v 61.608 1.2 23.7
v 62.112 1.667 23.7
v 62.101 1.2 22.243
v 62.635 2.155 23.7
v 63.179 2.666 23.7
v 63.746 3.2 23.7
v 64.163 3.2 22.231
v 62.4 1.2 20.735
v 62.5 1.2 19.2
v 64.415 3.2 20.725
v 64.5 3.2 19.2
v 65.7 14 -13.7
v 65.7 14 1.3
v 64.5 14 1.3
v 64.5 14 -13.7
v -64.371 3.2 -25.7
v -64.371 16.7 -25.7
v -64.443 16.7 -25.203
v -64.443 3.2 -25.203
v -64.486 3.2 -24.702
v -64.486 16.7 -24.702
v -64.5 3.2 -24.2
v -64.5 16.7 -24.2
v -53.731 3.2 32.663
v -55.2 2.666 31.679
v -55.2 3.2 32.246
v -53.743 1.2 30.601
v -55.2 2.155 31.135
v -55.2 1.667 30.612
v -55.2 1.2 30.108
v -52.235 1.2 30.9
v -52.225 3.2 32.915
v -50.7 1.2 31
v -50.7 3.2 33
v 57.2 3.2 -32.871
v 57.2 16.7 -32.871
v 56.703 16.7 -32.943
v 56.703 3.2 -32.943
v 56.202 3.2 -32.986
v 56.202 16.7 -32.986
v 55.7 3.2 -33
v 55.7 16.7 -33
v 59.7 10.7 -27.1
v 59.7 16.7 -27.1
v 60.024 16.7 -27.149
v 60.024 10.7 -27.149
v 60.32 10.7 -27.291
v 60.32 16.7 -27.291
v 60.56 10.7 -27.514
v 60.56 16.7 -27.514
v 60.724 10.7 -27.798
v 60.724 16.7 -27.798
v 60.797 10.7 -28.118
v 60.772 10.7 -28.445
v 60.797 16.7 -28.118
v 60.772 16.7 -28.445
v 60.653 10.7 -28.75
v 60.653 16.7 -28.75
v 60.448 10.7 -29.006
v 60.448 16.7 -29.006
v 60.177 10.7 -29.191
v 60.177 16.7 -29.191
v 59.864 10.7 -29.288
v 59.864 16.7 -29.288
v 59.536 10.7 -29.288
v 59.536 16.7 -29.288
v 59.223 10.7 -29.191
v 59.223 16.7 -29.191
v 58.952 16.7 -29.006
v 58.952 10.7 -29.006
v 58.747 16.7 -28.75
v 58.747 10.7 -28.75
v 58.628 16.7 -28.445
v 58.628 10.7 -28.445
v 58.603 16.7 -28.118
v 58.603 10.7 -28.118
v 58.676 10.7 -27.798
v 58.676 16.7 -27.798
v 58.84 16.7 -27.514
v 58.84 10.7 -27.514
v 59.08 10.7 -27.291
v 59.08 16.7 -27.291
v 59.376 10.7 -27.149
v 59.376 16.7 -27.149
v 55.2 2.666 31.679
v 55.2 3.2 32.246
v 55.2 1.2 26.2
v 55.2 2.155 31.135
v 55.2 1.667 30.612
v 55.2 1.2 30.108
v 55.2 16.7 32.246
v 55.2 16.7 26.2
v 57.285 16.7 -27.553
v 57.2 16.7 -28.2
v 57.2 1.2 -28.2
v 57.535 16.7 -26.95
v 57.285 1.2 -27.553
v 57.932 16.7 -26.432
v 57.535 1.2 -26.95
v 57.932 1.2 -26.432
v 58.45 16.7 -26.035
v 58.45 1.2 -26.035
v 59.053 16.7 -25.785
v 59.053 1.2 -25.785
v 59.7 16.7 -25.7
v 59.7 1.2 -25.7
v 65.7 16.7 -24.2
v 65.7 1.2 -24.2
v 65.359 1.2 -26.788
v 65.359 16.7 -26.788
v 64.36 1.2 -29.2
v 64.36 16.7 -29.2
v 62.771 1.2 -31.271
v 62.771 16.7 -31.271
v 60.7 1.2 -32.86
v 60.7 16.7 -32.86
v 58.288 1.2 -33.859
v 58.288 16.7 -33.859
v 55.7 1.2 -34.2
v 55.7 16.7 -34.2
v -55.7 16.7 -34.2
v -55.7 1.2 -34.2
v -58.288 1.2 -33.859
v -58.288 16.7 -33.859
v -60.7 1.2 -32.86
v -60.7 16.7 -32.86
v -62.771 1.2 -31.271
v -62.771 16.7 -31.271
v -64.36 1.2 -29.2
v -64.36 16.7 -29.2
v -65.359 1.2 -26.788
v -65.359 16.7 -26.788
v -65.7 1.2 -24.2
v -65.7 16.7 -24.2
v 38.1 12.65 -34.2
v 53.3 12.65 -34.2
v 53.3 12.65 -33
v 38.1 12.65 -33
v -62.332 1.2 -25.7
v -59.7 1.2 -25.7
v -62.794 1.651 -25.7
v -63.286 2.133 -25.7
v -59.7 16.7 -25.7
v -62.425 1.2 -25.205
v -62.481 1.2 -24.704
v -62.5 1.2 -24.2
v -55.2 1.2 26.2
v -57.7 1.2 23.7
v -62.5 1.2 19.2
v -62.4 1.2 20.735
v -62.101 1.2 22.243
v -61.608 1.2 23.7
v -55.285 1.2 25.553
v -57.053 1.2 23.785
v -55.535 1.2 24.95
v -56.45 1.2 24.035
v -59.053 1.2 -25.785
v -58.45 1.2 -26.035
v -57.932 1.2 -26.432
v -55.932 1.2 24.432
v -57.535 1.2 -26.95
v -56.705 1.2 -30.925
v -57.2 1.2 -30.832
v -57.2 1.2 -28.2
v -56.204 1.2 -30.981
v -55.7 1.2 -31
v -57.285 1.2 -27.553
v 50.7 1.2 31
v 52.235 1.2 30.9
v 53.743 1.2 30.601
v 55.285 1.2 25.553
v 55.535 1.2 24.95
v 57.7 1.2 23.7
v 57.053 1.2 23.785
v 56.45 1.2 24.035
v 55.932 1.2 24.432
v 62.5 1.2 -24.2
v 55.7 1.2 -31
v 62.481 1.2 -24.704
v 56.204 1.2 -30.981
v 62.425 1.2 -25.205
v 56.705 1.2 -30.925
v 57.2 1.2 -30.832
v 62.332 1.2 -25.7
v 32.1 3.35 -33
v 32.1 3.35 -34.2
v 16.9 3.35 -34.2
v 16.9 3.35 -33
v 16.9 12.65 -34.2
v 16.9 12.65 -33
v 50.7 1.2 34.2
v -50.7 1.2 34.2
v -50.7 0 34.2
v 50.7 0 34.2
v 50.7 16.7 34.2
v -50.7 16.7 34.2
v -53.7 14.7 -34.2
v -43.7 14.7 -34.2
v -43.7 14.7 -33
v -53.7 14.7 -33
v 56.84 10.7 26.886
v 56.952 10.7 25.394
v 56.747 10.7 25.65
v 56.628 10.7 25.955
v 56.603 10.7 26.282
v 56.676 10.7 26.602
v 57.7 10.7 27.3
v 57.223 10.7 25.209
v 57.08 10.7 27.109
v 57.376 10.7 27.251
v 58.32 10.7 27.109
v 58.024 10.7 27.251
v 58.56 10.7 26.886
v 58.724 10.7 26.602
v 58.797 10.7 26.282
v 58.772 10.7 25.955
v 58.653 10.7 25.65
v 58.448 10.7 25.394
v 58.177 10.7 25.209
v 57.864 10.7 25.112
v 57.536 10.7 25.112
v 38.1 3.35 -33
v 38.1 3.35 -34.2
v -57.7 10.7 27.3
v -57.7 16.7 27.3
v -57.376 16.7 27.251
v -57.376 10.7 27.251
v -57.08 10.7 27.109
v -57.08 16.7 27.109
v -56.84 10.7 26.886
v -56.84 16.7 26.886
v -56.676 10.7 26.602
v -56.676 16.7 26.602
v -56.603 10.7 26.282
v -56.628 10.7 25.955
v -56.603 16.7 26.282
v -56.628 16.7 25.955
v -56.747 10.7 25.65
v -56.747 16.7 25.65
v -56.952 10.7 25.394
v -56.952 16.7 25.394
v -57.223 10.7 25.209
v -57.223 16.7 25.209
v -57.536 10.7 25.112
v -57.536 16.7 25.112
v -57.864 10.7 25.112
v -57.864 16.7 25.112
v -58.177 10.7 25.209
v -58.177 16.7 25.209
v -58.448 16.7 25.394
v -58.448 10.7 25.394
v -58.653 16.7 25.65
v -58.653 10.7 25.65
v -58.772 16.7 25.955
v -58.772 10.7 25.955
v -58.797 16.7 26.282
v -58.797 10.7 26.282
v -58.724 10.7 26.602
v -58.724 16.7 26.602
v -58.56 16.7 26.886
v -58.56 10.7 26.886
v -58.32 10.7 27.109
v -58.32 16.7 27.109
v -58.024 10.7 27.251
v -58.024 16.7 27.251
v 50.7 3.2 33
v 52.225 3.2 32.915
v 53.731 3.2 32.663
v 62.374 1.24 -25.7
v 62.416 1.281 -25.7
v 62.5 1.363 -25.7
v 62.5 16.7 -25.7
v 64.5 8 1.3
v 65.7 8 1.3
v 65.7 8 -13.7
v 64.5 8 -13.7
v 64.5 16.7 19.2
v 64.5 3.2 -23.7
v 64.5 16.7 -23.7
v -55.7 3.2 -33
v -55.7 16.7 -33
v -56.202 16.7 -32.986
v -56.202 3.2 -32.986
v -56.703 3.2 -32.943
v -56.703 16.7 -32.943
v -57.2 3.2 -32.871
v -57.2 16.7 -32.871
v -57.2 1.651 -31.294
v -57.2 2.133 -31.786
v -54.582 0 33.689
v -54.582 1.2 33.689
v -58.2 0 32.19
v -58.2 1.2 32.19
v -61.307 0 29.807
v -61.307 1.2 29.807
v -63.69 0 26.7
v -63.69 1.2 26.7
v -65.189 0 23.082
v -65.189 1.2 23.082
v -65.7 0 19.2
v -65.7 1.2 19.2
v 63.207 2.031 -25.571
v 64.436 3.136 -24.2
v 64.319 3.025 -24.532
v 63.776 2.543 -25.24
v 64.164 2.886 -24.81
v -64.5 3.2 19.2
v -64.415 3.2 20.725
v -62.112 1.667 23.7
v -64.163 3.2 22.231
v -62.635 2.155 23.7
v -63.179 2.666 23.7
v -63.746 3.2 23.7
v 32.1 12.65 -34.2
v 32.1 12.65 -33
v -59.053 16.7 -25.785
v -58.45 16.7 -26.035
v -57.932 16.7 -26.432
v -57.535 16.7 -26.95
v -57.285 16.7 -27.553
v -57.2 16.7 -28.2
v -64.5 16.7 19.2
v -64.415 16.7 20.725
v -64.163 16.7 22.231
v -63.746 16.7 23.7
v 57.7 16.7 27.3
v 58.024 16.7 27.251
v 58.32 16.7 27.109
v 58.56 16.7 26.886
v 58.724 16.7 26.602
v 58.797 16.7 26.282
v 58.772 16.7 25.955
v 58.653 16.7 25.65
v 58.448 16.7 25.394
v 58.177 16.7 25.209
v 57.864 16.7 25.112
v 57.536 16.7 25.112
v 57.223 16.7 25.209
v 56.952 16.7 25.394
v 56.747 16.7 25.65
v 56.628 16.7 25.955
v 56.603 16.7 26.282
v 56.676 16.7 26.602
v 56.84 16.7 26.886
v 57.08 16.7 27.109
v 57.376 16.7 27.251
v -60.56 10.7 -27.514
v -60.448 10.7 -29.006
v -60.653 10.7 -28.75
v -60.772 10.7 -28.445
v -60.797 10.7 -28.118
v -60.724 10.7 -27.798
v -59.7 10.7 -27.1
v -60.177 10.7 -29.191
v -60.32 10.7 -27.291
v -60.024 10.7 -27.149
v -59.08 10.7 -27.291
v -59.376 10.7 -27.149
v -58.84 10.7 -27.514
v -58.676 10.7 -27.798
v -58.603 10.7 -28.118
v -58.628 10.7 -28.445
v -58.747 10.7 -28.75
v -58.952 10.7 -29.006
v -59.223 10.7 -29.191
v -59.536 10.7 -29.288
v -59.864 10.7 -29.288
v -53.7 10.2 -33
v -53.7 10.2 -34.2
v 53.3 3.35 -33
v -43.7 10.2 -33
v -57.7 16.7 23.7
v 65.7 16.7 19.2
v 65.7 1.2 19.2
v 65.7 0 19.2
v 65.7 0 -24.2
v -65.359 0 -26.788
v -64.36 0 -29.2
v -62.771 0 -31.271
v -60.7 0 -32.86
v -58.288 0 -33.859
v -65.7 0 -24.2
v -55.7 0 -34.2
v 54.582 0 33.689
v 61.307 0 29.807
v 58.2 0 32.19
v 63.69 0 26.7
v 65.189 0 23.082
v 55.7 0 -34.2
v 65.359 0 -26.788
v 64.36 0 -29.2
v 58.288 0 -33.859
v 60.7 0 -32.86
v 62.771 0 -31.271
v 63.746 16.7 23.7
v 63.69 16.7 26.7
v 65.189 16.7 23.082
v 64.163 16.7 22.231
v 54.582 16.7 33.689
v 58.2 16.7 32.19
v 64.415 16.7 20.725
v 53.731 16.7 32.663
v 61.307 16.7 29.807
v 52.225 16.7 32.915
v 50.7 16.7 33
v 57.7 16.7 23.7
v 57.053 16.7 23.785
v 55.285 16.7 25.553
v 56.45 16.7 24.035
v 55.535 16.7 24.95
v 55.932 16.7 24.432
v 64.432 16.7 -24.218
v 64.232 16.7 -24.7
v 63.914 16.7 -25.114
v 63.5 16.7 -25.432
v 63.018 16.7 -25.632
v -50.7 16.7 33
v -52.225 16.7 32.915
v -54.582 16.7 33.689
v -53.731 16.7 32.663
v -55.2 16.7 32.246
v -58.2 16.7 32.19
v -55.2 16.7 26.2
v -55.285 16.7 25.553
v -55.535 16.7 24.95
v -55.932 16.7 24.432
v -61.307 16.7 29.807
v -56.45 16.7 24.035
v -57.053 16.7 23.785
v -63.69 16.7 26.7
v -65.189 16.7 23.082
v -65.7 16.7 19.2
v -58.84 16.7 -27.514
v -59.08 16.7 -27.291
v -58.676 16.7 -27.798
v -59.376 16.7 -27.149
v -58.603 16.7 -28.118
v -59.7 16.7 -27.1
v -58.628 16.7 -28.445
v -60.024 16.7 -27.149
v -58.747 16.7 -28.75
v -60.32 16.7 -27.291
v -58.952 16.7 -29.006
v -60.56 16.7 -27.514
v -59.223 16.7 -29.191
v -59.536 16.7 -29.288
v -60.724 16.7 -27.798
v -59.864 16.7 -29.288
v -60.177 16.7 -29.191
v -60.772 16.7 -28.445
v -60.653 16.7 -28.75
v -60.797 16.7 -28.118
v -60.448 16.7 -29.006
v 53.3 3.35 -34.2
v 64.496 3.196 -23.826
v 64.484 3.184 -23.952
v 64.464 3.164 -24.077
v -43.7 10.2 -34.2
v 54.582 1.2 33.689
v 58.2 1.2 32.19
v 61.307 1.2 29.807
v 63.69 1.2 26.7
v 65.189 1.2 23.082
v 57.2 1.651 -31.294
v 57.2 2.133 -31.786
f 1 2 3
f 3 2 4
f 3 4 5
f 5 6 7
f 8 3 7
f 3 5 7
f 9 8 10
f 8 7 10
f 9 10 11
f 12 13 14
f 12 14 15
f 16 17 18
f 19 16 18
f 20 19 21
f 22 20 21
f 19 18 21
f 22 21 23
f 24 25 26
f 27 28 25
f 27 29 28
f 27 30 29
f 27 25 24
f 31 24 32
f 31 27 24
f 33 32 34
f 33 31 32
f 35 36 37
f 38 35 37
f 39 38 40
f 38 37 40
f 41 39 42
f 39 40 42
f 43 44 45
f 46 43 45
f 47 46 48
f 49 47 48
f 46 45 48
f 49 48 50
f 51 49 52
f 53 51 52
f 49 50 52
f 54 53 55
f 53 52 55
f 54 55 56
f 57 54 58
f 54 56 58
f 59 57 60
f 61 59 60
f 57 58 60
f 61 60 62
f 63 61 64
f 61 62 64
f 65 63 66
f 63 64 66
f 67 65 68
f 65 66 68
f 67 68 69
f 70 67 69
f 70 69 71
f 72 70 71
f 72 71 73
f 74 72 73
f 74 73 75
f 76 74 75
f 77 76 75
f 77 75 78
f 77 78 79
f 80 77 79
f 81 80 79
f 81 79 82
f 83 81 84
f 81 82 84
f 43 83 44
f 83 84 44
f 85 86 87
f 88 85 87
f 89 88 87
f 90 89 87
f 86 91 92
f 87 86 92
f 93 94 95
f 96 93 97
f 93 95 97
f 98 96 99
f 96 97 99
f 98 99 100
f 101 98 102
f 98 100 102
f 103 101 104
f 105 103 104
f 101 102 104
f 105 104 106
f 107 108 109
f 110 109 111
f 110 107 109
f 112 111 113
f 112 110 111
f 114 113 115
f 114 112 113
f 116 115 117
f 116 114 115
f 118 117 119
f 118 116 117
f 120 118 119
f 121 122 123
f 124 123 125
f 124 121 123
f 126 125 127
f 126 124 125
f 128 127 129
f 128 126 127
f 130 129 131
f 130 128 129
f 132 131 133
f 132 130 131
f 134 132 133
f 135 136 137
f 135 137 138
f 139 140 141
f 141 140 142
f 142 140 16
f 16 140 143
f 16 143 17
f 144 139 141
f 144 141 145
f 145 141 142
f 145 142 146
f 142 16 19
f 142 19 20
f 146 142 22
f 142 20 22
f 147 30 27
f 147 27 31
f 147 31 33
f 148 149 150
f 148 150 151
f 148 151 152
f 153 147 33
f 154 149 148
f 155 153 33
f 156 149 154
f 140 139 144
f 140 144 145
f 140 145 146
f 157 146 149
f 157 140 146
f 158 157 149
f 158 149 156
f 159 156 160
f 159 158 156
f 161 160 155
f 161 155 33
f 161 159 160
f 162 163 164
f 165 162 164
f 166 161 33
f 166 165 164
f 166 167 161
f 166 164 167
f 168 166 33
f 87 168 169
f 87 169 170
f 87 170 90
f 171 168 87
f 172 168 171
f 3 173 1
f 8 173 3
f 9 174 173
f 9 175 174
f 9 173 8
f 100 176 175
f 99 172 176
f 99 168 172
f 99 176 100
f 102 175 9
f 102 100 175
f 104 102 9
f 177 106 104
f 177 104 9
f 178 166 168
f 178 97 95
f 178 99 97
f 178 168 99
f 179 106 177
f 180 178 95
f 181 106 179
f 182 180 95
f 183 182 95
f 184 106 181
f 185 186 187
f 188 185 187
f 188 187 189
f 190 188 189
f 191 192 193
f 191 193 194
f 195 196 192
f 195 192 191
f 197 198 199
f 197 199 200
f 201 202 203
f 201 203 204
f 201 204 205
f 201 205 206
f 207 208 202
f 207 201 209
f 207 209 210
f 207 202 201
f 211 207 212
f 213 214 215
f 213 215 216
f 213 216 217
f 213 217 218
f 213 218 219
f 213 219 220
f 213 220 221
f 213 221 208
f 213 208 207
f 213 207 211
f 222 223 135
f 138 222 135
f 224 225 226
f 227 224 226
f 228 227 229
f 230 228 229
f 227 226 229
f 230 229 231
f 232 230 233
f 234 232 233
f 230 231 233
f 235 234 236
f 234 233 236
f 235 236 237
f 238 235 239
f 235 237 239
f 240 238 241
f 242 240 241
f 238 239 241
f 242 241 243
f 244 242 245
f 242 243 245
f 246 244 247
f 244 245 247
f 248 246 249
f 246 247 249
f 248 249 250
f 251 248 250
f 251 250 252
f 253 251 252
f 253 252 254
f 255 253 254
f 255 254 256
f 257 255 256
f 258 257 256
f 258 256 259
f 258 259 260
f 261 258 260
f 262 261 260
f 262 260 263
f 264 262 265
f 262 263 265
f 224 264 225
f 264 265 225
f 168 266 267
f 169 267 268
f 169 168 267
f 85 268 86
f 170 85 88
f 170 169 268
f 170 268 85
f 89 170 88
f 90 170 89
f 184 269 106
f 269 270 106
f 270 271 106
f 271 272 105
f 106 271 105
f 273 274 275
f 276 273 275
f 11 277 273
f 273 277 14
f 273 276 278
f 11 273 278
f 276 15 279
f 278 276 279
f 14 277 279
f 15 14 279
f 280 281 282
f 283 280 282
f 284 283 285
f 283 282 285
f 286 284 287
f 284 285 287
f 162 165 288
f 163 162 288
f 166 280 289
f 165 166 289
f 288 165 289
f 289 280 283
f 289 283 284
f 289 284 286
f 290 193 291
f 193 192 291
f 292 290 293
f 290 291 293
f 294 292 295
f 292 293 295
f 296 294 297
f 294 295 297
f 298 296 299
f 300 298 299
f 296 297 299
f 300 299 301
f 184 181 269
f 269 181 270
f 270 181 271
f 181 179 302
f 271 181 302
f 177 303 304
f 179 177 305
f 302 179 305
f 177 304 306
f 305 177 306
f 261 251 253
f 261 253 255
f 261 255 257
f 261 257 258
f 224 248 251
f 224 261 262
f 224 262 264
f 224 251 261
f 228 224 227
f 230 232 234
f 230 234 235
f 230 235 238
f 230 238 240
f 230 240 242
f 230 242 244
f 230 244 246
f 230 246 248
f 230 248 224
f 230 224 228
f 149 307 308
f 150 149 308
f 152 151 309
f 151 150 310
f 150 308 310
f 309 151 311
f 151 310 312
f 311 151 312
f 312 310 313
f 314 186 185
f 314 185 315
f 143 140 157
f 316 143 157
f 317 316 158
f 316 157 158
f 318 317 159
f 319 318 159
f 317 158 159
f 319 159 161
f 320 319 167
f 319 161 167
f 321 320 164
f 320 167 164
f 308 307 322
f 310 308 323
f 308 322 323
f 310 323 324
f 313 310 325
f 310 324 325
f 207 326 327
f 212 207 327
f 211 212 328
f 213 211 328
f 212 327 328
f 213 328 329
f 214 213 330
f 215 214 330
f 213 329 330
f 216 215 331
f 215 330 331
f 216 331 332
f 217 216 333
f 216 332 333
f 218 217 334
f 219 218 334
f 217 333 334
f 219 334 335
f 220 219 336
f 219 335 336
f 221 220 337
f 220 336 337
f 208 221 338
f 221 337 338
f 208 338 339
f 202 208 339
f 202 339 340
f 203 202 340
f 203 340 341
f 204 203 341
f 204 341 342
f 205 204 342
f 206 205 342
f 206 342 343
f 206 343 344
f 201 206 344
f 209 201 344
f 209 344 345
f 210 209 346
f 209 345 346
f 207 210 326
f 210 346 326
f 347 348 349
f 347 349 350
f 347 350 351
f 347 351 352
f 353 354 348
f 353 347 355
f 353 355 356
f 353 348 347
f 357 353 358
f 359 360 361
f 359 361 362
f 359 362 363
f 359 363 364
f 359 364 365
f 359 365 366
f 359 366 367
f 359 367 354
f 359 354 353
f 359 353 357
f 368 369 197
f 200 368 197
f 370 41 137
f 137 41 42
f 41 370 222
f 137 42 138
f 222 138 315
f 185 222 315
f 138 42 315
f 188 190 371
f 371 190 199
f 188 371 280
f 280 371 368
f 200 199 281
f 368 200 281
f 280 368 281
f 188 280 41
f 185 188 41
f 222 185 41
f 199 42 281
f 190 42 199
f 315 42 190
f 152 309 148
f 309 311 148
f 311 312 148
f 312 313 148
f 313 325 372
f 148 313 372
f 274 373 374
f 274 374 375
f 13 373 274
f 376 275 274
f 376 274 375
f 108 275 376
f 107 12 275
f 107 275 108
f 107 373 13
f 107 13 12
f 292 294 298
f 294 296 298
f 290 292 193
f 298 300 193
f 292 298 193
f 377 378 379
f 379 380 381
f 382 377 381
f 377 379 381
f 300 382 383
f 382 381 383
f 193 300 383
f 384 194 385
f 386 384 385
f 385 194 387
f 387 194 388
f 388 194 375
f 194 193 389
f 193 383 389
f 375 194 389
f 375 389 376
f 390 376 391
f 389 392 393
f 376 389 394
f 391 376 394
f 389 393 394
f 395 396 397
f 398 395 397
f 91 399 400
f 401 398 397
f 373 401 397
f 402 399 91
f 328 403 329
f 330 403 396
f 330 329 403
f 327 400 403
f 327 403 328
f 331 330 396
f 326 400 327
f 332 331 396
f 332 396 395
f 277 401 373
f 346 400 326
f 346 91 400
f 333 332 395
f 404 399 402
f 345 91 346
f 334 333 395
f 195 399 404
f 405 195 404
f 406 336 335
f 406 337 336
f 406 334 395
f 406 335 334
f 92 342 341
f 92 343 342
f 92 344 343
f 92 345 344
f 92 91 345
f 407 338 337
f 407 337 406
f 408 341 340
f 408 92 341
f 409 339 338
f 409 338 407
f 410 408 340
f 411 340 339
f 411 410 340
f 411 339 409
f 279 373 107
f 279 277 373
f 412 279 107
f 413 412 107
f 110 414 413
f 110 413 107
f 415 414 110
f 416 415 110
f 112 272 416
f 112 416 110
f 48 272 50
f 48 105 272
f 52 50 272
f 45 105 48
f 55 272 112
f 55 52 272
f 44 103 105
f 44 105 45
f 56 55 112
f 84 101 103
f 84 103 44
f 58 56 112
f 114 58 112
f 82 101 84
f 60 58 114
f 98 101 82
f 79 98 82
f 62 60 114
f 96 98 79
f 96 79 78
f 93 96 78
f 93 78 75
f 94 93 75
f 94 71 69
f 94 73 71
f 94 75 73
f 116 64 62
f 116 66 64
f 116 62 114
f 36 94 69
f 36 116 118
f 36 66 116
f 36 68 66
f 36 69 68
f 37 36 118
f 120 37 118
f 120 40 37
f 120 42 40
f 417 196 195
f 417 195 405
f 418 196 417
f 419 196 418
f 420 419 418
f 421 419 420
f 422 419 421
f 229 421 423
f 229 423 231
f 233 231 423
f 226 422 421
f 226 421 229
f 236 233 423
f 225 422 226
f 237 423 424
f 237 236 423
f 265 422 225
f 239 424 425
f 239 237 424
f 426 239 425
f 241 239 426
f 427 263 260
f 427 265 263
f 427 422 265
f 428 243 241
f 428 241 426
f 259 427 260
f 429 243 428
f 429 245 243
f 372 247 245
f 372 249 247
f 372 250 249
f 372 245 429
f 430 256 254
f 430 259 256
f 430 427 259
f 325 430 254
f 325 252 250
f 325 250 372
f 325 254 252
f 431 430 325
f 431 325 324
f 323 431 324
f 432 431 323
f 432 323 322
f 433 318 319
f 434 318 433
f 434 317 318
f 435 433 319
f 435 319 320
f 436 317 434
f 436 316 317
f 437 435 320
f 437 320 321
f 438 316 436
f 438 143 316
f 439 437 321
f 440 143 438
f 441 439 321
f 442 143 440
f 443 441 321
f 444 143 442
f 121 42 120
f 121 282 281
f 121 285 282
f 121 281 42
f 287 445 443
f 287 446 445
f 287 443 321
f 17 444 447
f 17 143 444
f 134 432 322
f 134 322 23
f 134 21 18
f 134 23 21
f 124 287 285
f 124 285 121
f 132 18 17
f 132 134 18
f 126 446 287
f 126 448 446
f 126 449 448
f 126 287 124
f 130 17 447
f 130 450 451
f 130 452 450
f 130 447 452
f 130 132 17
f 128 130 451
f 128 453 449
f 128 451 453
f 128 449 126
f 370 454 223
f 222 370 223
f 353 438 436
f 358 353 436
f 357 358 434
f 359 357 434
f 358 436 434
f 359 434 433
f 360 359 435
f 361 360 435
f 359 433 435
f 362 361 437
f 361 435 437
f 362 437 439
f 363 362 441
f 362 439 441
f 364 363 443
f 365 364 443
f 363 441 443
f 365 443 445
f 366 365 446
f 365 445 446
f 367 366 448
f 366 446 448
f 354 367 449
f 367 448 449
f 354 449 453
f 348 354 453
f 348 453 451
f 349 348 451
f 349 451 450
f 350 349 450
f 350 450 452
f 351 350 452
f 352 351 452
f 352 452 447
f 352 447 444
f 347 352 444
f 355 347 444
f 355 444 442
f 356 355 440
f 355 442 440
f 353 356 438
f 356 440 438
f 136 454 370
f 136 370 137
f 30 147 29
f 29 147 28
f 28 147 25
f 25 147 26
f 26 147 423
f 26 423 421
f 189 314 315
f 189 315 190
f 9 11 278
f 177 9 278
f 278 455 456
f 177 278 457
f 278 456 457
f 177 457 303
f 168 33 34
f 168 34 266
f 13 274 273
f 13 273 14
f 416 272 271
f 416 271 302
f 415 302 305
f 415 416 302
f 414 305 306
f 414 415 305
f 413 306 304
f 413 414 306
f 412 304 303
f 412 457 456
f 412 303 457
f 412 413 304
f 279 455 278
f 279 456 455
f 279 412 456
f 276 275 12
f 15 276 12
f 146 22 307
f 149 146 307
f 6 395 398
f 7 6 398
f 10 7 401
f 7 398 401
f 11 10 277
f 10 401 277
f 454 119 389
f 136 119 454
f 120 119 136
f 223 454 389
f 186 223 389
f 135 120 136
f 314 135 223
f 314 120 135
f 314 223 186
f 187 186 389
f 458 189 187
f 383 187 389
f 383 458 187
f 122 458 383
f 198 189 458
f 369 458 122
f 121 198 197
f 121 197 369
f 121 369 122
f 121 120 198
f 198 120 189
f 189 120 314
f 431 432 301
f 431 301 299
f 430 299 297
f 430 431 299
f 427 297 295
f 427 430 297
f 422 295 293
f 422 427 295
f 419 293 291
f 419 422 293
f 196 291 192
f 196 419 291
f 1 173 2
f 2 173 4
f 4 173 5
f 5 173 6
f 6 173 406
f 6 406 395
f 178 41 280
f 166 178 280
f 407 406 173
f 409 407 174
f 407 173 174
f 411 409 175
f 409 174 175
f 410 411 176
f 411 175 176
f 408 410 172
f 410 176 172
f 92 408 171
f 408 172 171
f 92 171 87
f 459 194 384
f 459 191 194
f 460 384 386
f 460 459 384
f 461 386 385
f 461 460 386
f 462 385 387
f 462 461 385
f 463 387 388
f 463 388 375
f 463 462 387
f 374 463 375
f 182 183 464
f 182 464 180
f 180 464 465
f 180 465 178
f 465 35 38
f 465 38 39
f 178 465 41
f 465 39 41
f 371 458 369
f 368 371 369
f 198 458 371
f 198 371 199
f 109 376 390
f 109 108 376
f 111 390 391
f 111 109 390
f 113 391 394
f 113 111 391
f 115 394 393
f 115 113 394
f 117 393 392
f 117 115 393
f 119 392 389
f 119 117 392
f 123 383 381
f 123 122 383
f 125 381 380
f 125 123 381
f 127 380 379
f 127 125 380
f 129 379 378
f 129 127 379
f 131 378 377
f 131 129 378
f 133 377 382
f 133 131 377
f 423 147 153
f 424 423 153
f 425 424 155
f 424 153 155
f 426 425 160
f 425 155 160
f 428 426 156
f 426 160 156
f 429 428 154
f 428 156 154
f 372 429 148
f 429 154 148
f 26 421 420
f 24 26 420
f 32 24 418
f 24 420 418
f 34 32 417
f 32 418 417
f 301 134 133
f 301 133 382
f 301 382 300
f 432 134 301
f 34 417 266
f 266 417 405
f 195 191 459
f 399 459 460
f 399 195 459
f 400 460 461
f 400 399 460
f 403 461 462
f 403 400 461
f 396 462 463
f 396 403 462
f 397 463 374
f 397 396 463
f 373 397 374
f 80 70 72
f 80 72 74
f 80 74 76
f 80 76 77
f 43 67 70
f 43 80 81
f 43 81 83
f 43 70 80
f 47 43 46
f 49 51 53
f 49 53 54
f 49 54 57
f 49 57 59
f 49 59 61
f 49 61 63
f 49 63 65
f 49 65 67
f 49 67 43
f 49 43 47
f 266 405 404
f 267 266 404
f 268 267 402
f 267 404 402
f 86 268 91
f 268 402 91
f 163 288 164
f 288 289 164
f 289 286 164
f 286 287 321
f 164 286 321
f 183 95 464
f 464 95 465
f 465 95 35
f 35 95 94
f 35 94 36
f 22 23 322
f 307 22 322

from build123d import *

# Parameters (mm, degrees)
ESBO_O1_W                   = 131.4
ESBO_O1_H                   = 68.4
BASE_DEPTH                  = 1.2
FILETE1_R                   = 15
FILETE2_R                   = 15
FILETE3_R                   = 10
FILETE4_R                   = 10
PAREDES_START               = 15.5
PAREDES_DEPTH               = 15.5
ESBO_O6_R                   = 2.5
SUPORTE_DOS_PARAFUSOS_DEPTH = 15.5
ESBO_O7_R                   = 1.1
FURO_DOS_PARAFUSOS_DEPTH    = 6
FECHAMENTOS_REACH           = 77.928
ESBO_O14_W                  = 10
ESBO_O14_H                  = 4.5
CORTE_DO_USB_DEPTH          = 10
ESBO_O16_W                  = 15.2
ESBO_O16_H                  = 9.3
CORTE_DAS_CHAVES_DEPTH      = 10
ESBO_O17_W                  = 15
ESBO_O17_H                  = 6
CORTE_SD_DEPTH              = 10
CHANFRO_BASE_INTERIOR_SIZE  = 2
FILETE5_R                   = 2


with BuildPart() as part:
    # Esboço1 → Base (new body)
    with BuildSketch(Plane(origin=(0, 0, 0), x_dir=(1, 0, 0), z_dir=(0, 1, 0))):
        Rectangle(ESBO_O1_W, ESBO_O1_H)
    extrude(amount=BASE_DEPTH)

    # Filete1
    filete1_edges = [part.edges().sort_by_distance(p)[0] for p in [
        (65.7, 0.6, 34.2),
    ]]
    fillet(filete1_edges, radius=FILETE1_R)

    # Filete2
    filete2_edges = [part.edges().sort_by_distance(p)[0] for p in [
        (-65.7, 0.6, 34.2),
    ]]
    fillet(filete2_edges, radius=FILETE2_R)

    # Filete3
    filete3_edges = [part.edges().sort_by_distance(p)[0] for p in [
        (65.7, 0.6, -34.2),
    ]]
    fillet(filete3_edges, radius=FILETE3_R)

    # Filete4
    filete4_edges = [part.edges().sort_by_distance(p)[0] for p in [
        (-65.7, 0.6, -34.2),
    ]]
    fillet(filete4_edges, radius=FILETE4_R)

    # Esboço5 → Paredes (add)
    with BuildSketch(Plane(origin=(0, 1.2, 0), x_dir=(1, 0, 0), z_dir=(0, 1, 0)).offset(PAREDES_START)):
        with BuildLine():
            Line((55.7, 34.2), (-55.7, 34.2))
            ThreePointArc((-55.7, 34.2), (-62.771067812, 31.271067812), (-65.7, 24.2))
            Line((-65.7, 24.2), (-65.7, -19.2))
            ThreePointArc((-65.7, -19.2), (-61.306601718, -29.806601718), (-50.7, -34.2))
            Line((-50.7, -34.2), (50.7, -34.2))
            ThreePointArc((50.7, -34.2), (61.306601718, -29.806601718), (65.7, -19.2))
            Line((65.7, -19.2), (65.7, 24.2))
            ThreePointArc((65.7, 24.2), (62.771067812, 31.271067812), (55.7, 34.2))
        make_face()
        with BuildLine():
            Line((55.7, 33), (-55.7, 33))
            ThreePointArc((-55.7, 33), (-61.922539674, 30.422539674), (-64.5, 24.2))
            Line((-64.5, 24.2), (-64.5, -19.2))
            ThreePointArc((-64.5, -19.2), (-60.45807358, -28.95807358), (-50.7, -33))
            Line((-50.7, -33), (50.7, -33))
            ThreePointArc((50.7, -33), (60.45807358, -28.95807358), (64.5, -19.2))
            Line((64.5, -19.2), (64.5, 24.2))
            ThreePointArc((64.5, 24.2), (61.922539674, 30.422539674), (55.7, 33))
        make_face(mode=Mode.SUBTRACT)
    extrude(amount=-PAREDES_DEPTH)

    # Esboço6 → Suporte dos parafusos (add)
    with BuildSketch(Plane(origin=(0, 1.2, 0), x_dir=(1, 0, 0), z_dir=(0, 1, 0))):
        with Locations(Location((-59.7, 28.2, 0), (0, 0, 90))):
            Circle(ESBO_O6_R)
        with Locations(Location((-57.7, -26.2, 0), (0, 0, 90))):
            Circle(ESBO_O6_R)
        with Locations(Location((59.7, 28.2, 0), (0, 0, 90))):
            Circle(ESBO_O6_R)
        with Locations(Location((57.7, -26.2, 0), (0, 0, 90))):
            Circle(ESBO_O6_R)
    extrude(amount=SUPORTE_DOS_PARAFUSOS_DEPTH)

    # Esboço7 → Furo dos parafusos (cut)
    with BuildSketch(Plane(origin=(0, 16.7, 0), x_dir=(1, 0, 0), z_dir=(0, 1, 0))):
        with Locations(Location((-59.7, 28.2, 0), (0, 0, 270))):
            Circle(ESBO_O7_R)
        with Locations(Location((59.7, 28.2, 0), (0, 0, 270))):
            Circle(ESBO_O7_R)
        with Locations(Location((57.7, -26.2, 0), (0, 0, 270))):
            Circle(ESBO_O7_R)
        with Locations(Location((-57.7, -26.2, 0), (0, 0, 270))):
            Circle(ESBO_O7_R)
    extrude(amount=-FURO_DOS_PARAFUSOS_DEPTH, mode=Mode.SUBTRACT)

    # Esboço23 → Fechamentos (add, up to next)
    with BuildSketch(Plane(origin=(0, 16.7, 0), x_dir=(1, 0, 0), z_dir=(0, 1, 0)), mode=Mode.PRIVATE) as fechamentos_sk1:
        with BuildLine():
            Line((57.2, 28.2), (57.2, 32.871216754))
            ThreePointArc((57.2, 32.871216754), (61.922539674, 30.422539674), (64.371216754, 25.7))
            Line((64.371216754, 25.7), (59.7, 25.7))
            Line((59.7, 25.7), (62.2, 28.2))
            Line((62.2, 28.2), (59.7, 30.7))
            Line((59.7, 30.7), (57.2, 28.2))
        make_face()
    fechamentos_tool1 = extrude(fechamentos_sk1.sketch, amount=-FECHAMENTOS_REACH, mode=Mode.PRIVATE) - part.part
    # Esboço23 → Fechamentos (add, up to next)
    with BuildSketch(Plane(origin=(0, 16.7, 0), x_dir=(1, 0, 0), z_dir=(0, 1, 0)), mode=Mode.PRIVATE) as fechamentos_sk2:
        with BuildLine():
            Line((-59.7, 25.7), (-64.371216754, 25.7))
            ThreePointArc((-64.371216754, 25.7), (-61.922539674, 30.422539674), (-57.2, 32.871216754))
            Line((-57.2, 32.871216754), (-57.2, 28.2))
            Line((-57.2, 28.2), (-59.7, 30.7))
            Line((-59.7, 30.7), (-62.2, 28.2))
            Line((-62.2, 28.2), (-59.7, 25.7))
        make_face()
    fechamentos_tool2 = extrude(fechamentos_sk2.sketch, amount=-FECHAMENTOS_REACH, mode=Mode.PRIVATE) - part.part
    # Esboço23 → Fechamentos (add, up to next)
    with BuildSketch(Plane(origin=(0, 16.7, 0), x_dir=(1, 0, 0), z_dir=(0, 1, 0)), mode=Mode.PRIVATE) as fechamentos_sk3:
        with BuildLine():
            Line((57.7, -23.7), (63.745688943, -23.7))
            ThreePointArc((63.745688943, -23.7), (60.45807358, -28.95807358), (55.2, -32.245688943))
            Line((55.2, -32.245688943), (55.2, -26.2))
            Line((55.2, -26.2), (57.7, -28.7))
            Line((57.7, -28.7), (60.2, -26.2))
            Line((60.2, -26.2), (57.7, -23.7))
        make_face()
    fechamentos_tool3 = extrude(fechamentos_sk3.sketch, amount=-FECHAMENTOS_REACH, mode=Mode.PRIVATE) - part.part
    # Esboço23 → Fechamentos (add, up to next)
    with BuildSketch(Plane(origin=(0, 16.7, 0), x_dir=(1, 0, 0), z_dir=(0, 1, 0)), mode=Mode.PRIVATE) as fechamentos_sk4:
        with BuildLine():
            Line((-55.2, -26.2), (-55.2, -32.245688943))
            ThreePointArc((-55.2, -32.245688943), (-60.45807358, -28.95807358), (-63.745688943, -23.7))
            Line((-63.745688943, -23.7), (-57.7, -23.7))
            Line((-57.7, -23.7), (-60.2, -26.2))
            Line((-60.2, -26.2), (-57.7, -28.7))
            Line((-57.7, -28.7), (-55.2, -26.2))
        make_face()
    fechamentos_tool4 = extrude(fechamentos_sk4.sketch, amount=-FECHAMENTOS_REACH, mode=Mode.PRIVATE) - part.part
    add(fechamentos_tool1.solids().sort_by_distance((57.301416, 16.7, -30.535608))[0])
    add(fechamentos_tool2.solids().sort_by_distance((-62.035608, 16.7, -25.801416))[0])
    add(fechamentos_tool3.solids().sort_by_distance((59.019684, 16.7, 27.519684))[0])
    add(fechamentos_tool4.solids().sort_by_distance((-59.019684, 16.7, 27.519684))[0])

    # Esboço14 → Corte do USB (cut)
    with BuildSketch(Plane(origin=(0, 0, -34.2), x_dir=(-1, 0, 0), z_dir=(0, 0, -1))):
        with Locations((48.7, 12.45)):
            Rectangle(ESBO_O14_W, ESBO_O14_H)
    extrude(amount=-CORTE_DO_USB_DEPTH, mode=Mode.SUBTRACT)

    # Esboço16 → Corte das chaves (cut)
    with BuildSketch(Plane(origin=(0, 0, -34.2), x_dir=(-1, 0, 0), z_dir=(0, 0, -1))):
        with Locations((-45.7, 8)):
            Rectangle(ESBO_O16_W, ESBO_O16_H)
        with Locations((-24.5, 8)):
            Rectangle(ESBO_O16_W, ESBO_O16_H)
    extrude(amount=-CORTE_DAS_CHAVES_DEPTH, mode=Mode.SUBTRACT)

    # Esboço17 → Corte SD (cut)
    with BuildSketch(Plane(origin=(65.7, 0, 0), x_dir=(0, 0, -1), z_dir=(1, 0, 0))):
        with Locations((6.2, 11)):
            Rectangle(ESBO_O17_W, ESBO_O17_H)
    extrude(amount=-CORTE_SD_DEPTH, mode=Mode.SUBTRACT)

    # Chanfro base interior
    chanfro_base_interior_edges = [part.edges().sort_by_distance(p)[0] for p in [
        (56.452759112, 1.2, -32.967745076),
        (-64.467745076, 1.2, -24.952759112),
        (64.310115859, 1.2, 21.481391306),
        (-52.981391306, 1.2, 32.810115859),
        (64.467745076, 1.2, -24.952759112),
        (0, 1.2, -33),
        (-56.452759112, 1.2, -32.967745076),
        (-64.5, 1.2, -2.5),
        (-64.310115859, 1.2, 21.481391306),
        (0, 1.2, 33),
        (52.981391306, 1.2, 32.810115859),
        (64.5, 1.2, -2.5),
    ]]
    chamfer(chanfro_base_interior_edges, length=CHANFRO_BASE_INTERIOR_SIZE)

    # Filete5
    # the kernel refuses this fillet: 2 mm, written as the material it adds along each edge
    with BuildSketch(Plane(origin=(64.371216754, 16.7, -25.7), x_dir=(0.06425854366242006, 0, 0.9979332841259403), z_dir=(0, -1, 0))) as filete5_piece_1_section:
        with BuildLine():
            CenterArc((1.875624905, 1.995866568), FILETE5_R, 183.684281821, 90)
            Line((-0.120241664, 1.867349481), (-0.31982832, 1.854497772))
            Line((-0.31982832, 1.854497772), (-0.199586657, -0.012851709))
            Line((-0.199586657, -0.012851709), (-0.021356822, -0.198856446))
            ThreePointArc((-0.021356822, -0.198856446), (1.518027059, -0.231715929), (2.016993701, -0.199586657))
            Line((2.016993701, -0.199586657), (2.004141992, 0))
        make_face()
    filete5_piece_1 = extrude(amount=18.51035498, mode=Mode.PRIVATE)
    filete5_piece_1 = split(filete5_piece_1, bisect_by=Plane(origin=(63.917041989, 0, -25.117041989), z_dir=(0, 1, 0)), keep=Keep.TOP, mode=Mode.PRIVATE)
    add(filete5_piece_1)


solid = part.part
